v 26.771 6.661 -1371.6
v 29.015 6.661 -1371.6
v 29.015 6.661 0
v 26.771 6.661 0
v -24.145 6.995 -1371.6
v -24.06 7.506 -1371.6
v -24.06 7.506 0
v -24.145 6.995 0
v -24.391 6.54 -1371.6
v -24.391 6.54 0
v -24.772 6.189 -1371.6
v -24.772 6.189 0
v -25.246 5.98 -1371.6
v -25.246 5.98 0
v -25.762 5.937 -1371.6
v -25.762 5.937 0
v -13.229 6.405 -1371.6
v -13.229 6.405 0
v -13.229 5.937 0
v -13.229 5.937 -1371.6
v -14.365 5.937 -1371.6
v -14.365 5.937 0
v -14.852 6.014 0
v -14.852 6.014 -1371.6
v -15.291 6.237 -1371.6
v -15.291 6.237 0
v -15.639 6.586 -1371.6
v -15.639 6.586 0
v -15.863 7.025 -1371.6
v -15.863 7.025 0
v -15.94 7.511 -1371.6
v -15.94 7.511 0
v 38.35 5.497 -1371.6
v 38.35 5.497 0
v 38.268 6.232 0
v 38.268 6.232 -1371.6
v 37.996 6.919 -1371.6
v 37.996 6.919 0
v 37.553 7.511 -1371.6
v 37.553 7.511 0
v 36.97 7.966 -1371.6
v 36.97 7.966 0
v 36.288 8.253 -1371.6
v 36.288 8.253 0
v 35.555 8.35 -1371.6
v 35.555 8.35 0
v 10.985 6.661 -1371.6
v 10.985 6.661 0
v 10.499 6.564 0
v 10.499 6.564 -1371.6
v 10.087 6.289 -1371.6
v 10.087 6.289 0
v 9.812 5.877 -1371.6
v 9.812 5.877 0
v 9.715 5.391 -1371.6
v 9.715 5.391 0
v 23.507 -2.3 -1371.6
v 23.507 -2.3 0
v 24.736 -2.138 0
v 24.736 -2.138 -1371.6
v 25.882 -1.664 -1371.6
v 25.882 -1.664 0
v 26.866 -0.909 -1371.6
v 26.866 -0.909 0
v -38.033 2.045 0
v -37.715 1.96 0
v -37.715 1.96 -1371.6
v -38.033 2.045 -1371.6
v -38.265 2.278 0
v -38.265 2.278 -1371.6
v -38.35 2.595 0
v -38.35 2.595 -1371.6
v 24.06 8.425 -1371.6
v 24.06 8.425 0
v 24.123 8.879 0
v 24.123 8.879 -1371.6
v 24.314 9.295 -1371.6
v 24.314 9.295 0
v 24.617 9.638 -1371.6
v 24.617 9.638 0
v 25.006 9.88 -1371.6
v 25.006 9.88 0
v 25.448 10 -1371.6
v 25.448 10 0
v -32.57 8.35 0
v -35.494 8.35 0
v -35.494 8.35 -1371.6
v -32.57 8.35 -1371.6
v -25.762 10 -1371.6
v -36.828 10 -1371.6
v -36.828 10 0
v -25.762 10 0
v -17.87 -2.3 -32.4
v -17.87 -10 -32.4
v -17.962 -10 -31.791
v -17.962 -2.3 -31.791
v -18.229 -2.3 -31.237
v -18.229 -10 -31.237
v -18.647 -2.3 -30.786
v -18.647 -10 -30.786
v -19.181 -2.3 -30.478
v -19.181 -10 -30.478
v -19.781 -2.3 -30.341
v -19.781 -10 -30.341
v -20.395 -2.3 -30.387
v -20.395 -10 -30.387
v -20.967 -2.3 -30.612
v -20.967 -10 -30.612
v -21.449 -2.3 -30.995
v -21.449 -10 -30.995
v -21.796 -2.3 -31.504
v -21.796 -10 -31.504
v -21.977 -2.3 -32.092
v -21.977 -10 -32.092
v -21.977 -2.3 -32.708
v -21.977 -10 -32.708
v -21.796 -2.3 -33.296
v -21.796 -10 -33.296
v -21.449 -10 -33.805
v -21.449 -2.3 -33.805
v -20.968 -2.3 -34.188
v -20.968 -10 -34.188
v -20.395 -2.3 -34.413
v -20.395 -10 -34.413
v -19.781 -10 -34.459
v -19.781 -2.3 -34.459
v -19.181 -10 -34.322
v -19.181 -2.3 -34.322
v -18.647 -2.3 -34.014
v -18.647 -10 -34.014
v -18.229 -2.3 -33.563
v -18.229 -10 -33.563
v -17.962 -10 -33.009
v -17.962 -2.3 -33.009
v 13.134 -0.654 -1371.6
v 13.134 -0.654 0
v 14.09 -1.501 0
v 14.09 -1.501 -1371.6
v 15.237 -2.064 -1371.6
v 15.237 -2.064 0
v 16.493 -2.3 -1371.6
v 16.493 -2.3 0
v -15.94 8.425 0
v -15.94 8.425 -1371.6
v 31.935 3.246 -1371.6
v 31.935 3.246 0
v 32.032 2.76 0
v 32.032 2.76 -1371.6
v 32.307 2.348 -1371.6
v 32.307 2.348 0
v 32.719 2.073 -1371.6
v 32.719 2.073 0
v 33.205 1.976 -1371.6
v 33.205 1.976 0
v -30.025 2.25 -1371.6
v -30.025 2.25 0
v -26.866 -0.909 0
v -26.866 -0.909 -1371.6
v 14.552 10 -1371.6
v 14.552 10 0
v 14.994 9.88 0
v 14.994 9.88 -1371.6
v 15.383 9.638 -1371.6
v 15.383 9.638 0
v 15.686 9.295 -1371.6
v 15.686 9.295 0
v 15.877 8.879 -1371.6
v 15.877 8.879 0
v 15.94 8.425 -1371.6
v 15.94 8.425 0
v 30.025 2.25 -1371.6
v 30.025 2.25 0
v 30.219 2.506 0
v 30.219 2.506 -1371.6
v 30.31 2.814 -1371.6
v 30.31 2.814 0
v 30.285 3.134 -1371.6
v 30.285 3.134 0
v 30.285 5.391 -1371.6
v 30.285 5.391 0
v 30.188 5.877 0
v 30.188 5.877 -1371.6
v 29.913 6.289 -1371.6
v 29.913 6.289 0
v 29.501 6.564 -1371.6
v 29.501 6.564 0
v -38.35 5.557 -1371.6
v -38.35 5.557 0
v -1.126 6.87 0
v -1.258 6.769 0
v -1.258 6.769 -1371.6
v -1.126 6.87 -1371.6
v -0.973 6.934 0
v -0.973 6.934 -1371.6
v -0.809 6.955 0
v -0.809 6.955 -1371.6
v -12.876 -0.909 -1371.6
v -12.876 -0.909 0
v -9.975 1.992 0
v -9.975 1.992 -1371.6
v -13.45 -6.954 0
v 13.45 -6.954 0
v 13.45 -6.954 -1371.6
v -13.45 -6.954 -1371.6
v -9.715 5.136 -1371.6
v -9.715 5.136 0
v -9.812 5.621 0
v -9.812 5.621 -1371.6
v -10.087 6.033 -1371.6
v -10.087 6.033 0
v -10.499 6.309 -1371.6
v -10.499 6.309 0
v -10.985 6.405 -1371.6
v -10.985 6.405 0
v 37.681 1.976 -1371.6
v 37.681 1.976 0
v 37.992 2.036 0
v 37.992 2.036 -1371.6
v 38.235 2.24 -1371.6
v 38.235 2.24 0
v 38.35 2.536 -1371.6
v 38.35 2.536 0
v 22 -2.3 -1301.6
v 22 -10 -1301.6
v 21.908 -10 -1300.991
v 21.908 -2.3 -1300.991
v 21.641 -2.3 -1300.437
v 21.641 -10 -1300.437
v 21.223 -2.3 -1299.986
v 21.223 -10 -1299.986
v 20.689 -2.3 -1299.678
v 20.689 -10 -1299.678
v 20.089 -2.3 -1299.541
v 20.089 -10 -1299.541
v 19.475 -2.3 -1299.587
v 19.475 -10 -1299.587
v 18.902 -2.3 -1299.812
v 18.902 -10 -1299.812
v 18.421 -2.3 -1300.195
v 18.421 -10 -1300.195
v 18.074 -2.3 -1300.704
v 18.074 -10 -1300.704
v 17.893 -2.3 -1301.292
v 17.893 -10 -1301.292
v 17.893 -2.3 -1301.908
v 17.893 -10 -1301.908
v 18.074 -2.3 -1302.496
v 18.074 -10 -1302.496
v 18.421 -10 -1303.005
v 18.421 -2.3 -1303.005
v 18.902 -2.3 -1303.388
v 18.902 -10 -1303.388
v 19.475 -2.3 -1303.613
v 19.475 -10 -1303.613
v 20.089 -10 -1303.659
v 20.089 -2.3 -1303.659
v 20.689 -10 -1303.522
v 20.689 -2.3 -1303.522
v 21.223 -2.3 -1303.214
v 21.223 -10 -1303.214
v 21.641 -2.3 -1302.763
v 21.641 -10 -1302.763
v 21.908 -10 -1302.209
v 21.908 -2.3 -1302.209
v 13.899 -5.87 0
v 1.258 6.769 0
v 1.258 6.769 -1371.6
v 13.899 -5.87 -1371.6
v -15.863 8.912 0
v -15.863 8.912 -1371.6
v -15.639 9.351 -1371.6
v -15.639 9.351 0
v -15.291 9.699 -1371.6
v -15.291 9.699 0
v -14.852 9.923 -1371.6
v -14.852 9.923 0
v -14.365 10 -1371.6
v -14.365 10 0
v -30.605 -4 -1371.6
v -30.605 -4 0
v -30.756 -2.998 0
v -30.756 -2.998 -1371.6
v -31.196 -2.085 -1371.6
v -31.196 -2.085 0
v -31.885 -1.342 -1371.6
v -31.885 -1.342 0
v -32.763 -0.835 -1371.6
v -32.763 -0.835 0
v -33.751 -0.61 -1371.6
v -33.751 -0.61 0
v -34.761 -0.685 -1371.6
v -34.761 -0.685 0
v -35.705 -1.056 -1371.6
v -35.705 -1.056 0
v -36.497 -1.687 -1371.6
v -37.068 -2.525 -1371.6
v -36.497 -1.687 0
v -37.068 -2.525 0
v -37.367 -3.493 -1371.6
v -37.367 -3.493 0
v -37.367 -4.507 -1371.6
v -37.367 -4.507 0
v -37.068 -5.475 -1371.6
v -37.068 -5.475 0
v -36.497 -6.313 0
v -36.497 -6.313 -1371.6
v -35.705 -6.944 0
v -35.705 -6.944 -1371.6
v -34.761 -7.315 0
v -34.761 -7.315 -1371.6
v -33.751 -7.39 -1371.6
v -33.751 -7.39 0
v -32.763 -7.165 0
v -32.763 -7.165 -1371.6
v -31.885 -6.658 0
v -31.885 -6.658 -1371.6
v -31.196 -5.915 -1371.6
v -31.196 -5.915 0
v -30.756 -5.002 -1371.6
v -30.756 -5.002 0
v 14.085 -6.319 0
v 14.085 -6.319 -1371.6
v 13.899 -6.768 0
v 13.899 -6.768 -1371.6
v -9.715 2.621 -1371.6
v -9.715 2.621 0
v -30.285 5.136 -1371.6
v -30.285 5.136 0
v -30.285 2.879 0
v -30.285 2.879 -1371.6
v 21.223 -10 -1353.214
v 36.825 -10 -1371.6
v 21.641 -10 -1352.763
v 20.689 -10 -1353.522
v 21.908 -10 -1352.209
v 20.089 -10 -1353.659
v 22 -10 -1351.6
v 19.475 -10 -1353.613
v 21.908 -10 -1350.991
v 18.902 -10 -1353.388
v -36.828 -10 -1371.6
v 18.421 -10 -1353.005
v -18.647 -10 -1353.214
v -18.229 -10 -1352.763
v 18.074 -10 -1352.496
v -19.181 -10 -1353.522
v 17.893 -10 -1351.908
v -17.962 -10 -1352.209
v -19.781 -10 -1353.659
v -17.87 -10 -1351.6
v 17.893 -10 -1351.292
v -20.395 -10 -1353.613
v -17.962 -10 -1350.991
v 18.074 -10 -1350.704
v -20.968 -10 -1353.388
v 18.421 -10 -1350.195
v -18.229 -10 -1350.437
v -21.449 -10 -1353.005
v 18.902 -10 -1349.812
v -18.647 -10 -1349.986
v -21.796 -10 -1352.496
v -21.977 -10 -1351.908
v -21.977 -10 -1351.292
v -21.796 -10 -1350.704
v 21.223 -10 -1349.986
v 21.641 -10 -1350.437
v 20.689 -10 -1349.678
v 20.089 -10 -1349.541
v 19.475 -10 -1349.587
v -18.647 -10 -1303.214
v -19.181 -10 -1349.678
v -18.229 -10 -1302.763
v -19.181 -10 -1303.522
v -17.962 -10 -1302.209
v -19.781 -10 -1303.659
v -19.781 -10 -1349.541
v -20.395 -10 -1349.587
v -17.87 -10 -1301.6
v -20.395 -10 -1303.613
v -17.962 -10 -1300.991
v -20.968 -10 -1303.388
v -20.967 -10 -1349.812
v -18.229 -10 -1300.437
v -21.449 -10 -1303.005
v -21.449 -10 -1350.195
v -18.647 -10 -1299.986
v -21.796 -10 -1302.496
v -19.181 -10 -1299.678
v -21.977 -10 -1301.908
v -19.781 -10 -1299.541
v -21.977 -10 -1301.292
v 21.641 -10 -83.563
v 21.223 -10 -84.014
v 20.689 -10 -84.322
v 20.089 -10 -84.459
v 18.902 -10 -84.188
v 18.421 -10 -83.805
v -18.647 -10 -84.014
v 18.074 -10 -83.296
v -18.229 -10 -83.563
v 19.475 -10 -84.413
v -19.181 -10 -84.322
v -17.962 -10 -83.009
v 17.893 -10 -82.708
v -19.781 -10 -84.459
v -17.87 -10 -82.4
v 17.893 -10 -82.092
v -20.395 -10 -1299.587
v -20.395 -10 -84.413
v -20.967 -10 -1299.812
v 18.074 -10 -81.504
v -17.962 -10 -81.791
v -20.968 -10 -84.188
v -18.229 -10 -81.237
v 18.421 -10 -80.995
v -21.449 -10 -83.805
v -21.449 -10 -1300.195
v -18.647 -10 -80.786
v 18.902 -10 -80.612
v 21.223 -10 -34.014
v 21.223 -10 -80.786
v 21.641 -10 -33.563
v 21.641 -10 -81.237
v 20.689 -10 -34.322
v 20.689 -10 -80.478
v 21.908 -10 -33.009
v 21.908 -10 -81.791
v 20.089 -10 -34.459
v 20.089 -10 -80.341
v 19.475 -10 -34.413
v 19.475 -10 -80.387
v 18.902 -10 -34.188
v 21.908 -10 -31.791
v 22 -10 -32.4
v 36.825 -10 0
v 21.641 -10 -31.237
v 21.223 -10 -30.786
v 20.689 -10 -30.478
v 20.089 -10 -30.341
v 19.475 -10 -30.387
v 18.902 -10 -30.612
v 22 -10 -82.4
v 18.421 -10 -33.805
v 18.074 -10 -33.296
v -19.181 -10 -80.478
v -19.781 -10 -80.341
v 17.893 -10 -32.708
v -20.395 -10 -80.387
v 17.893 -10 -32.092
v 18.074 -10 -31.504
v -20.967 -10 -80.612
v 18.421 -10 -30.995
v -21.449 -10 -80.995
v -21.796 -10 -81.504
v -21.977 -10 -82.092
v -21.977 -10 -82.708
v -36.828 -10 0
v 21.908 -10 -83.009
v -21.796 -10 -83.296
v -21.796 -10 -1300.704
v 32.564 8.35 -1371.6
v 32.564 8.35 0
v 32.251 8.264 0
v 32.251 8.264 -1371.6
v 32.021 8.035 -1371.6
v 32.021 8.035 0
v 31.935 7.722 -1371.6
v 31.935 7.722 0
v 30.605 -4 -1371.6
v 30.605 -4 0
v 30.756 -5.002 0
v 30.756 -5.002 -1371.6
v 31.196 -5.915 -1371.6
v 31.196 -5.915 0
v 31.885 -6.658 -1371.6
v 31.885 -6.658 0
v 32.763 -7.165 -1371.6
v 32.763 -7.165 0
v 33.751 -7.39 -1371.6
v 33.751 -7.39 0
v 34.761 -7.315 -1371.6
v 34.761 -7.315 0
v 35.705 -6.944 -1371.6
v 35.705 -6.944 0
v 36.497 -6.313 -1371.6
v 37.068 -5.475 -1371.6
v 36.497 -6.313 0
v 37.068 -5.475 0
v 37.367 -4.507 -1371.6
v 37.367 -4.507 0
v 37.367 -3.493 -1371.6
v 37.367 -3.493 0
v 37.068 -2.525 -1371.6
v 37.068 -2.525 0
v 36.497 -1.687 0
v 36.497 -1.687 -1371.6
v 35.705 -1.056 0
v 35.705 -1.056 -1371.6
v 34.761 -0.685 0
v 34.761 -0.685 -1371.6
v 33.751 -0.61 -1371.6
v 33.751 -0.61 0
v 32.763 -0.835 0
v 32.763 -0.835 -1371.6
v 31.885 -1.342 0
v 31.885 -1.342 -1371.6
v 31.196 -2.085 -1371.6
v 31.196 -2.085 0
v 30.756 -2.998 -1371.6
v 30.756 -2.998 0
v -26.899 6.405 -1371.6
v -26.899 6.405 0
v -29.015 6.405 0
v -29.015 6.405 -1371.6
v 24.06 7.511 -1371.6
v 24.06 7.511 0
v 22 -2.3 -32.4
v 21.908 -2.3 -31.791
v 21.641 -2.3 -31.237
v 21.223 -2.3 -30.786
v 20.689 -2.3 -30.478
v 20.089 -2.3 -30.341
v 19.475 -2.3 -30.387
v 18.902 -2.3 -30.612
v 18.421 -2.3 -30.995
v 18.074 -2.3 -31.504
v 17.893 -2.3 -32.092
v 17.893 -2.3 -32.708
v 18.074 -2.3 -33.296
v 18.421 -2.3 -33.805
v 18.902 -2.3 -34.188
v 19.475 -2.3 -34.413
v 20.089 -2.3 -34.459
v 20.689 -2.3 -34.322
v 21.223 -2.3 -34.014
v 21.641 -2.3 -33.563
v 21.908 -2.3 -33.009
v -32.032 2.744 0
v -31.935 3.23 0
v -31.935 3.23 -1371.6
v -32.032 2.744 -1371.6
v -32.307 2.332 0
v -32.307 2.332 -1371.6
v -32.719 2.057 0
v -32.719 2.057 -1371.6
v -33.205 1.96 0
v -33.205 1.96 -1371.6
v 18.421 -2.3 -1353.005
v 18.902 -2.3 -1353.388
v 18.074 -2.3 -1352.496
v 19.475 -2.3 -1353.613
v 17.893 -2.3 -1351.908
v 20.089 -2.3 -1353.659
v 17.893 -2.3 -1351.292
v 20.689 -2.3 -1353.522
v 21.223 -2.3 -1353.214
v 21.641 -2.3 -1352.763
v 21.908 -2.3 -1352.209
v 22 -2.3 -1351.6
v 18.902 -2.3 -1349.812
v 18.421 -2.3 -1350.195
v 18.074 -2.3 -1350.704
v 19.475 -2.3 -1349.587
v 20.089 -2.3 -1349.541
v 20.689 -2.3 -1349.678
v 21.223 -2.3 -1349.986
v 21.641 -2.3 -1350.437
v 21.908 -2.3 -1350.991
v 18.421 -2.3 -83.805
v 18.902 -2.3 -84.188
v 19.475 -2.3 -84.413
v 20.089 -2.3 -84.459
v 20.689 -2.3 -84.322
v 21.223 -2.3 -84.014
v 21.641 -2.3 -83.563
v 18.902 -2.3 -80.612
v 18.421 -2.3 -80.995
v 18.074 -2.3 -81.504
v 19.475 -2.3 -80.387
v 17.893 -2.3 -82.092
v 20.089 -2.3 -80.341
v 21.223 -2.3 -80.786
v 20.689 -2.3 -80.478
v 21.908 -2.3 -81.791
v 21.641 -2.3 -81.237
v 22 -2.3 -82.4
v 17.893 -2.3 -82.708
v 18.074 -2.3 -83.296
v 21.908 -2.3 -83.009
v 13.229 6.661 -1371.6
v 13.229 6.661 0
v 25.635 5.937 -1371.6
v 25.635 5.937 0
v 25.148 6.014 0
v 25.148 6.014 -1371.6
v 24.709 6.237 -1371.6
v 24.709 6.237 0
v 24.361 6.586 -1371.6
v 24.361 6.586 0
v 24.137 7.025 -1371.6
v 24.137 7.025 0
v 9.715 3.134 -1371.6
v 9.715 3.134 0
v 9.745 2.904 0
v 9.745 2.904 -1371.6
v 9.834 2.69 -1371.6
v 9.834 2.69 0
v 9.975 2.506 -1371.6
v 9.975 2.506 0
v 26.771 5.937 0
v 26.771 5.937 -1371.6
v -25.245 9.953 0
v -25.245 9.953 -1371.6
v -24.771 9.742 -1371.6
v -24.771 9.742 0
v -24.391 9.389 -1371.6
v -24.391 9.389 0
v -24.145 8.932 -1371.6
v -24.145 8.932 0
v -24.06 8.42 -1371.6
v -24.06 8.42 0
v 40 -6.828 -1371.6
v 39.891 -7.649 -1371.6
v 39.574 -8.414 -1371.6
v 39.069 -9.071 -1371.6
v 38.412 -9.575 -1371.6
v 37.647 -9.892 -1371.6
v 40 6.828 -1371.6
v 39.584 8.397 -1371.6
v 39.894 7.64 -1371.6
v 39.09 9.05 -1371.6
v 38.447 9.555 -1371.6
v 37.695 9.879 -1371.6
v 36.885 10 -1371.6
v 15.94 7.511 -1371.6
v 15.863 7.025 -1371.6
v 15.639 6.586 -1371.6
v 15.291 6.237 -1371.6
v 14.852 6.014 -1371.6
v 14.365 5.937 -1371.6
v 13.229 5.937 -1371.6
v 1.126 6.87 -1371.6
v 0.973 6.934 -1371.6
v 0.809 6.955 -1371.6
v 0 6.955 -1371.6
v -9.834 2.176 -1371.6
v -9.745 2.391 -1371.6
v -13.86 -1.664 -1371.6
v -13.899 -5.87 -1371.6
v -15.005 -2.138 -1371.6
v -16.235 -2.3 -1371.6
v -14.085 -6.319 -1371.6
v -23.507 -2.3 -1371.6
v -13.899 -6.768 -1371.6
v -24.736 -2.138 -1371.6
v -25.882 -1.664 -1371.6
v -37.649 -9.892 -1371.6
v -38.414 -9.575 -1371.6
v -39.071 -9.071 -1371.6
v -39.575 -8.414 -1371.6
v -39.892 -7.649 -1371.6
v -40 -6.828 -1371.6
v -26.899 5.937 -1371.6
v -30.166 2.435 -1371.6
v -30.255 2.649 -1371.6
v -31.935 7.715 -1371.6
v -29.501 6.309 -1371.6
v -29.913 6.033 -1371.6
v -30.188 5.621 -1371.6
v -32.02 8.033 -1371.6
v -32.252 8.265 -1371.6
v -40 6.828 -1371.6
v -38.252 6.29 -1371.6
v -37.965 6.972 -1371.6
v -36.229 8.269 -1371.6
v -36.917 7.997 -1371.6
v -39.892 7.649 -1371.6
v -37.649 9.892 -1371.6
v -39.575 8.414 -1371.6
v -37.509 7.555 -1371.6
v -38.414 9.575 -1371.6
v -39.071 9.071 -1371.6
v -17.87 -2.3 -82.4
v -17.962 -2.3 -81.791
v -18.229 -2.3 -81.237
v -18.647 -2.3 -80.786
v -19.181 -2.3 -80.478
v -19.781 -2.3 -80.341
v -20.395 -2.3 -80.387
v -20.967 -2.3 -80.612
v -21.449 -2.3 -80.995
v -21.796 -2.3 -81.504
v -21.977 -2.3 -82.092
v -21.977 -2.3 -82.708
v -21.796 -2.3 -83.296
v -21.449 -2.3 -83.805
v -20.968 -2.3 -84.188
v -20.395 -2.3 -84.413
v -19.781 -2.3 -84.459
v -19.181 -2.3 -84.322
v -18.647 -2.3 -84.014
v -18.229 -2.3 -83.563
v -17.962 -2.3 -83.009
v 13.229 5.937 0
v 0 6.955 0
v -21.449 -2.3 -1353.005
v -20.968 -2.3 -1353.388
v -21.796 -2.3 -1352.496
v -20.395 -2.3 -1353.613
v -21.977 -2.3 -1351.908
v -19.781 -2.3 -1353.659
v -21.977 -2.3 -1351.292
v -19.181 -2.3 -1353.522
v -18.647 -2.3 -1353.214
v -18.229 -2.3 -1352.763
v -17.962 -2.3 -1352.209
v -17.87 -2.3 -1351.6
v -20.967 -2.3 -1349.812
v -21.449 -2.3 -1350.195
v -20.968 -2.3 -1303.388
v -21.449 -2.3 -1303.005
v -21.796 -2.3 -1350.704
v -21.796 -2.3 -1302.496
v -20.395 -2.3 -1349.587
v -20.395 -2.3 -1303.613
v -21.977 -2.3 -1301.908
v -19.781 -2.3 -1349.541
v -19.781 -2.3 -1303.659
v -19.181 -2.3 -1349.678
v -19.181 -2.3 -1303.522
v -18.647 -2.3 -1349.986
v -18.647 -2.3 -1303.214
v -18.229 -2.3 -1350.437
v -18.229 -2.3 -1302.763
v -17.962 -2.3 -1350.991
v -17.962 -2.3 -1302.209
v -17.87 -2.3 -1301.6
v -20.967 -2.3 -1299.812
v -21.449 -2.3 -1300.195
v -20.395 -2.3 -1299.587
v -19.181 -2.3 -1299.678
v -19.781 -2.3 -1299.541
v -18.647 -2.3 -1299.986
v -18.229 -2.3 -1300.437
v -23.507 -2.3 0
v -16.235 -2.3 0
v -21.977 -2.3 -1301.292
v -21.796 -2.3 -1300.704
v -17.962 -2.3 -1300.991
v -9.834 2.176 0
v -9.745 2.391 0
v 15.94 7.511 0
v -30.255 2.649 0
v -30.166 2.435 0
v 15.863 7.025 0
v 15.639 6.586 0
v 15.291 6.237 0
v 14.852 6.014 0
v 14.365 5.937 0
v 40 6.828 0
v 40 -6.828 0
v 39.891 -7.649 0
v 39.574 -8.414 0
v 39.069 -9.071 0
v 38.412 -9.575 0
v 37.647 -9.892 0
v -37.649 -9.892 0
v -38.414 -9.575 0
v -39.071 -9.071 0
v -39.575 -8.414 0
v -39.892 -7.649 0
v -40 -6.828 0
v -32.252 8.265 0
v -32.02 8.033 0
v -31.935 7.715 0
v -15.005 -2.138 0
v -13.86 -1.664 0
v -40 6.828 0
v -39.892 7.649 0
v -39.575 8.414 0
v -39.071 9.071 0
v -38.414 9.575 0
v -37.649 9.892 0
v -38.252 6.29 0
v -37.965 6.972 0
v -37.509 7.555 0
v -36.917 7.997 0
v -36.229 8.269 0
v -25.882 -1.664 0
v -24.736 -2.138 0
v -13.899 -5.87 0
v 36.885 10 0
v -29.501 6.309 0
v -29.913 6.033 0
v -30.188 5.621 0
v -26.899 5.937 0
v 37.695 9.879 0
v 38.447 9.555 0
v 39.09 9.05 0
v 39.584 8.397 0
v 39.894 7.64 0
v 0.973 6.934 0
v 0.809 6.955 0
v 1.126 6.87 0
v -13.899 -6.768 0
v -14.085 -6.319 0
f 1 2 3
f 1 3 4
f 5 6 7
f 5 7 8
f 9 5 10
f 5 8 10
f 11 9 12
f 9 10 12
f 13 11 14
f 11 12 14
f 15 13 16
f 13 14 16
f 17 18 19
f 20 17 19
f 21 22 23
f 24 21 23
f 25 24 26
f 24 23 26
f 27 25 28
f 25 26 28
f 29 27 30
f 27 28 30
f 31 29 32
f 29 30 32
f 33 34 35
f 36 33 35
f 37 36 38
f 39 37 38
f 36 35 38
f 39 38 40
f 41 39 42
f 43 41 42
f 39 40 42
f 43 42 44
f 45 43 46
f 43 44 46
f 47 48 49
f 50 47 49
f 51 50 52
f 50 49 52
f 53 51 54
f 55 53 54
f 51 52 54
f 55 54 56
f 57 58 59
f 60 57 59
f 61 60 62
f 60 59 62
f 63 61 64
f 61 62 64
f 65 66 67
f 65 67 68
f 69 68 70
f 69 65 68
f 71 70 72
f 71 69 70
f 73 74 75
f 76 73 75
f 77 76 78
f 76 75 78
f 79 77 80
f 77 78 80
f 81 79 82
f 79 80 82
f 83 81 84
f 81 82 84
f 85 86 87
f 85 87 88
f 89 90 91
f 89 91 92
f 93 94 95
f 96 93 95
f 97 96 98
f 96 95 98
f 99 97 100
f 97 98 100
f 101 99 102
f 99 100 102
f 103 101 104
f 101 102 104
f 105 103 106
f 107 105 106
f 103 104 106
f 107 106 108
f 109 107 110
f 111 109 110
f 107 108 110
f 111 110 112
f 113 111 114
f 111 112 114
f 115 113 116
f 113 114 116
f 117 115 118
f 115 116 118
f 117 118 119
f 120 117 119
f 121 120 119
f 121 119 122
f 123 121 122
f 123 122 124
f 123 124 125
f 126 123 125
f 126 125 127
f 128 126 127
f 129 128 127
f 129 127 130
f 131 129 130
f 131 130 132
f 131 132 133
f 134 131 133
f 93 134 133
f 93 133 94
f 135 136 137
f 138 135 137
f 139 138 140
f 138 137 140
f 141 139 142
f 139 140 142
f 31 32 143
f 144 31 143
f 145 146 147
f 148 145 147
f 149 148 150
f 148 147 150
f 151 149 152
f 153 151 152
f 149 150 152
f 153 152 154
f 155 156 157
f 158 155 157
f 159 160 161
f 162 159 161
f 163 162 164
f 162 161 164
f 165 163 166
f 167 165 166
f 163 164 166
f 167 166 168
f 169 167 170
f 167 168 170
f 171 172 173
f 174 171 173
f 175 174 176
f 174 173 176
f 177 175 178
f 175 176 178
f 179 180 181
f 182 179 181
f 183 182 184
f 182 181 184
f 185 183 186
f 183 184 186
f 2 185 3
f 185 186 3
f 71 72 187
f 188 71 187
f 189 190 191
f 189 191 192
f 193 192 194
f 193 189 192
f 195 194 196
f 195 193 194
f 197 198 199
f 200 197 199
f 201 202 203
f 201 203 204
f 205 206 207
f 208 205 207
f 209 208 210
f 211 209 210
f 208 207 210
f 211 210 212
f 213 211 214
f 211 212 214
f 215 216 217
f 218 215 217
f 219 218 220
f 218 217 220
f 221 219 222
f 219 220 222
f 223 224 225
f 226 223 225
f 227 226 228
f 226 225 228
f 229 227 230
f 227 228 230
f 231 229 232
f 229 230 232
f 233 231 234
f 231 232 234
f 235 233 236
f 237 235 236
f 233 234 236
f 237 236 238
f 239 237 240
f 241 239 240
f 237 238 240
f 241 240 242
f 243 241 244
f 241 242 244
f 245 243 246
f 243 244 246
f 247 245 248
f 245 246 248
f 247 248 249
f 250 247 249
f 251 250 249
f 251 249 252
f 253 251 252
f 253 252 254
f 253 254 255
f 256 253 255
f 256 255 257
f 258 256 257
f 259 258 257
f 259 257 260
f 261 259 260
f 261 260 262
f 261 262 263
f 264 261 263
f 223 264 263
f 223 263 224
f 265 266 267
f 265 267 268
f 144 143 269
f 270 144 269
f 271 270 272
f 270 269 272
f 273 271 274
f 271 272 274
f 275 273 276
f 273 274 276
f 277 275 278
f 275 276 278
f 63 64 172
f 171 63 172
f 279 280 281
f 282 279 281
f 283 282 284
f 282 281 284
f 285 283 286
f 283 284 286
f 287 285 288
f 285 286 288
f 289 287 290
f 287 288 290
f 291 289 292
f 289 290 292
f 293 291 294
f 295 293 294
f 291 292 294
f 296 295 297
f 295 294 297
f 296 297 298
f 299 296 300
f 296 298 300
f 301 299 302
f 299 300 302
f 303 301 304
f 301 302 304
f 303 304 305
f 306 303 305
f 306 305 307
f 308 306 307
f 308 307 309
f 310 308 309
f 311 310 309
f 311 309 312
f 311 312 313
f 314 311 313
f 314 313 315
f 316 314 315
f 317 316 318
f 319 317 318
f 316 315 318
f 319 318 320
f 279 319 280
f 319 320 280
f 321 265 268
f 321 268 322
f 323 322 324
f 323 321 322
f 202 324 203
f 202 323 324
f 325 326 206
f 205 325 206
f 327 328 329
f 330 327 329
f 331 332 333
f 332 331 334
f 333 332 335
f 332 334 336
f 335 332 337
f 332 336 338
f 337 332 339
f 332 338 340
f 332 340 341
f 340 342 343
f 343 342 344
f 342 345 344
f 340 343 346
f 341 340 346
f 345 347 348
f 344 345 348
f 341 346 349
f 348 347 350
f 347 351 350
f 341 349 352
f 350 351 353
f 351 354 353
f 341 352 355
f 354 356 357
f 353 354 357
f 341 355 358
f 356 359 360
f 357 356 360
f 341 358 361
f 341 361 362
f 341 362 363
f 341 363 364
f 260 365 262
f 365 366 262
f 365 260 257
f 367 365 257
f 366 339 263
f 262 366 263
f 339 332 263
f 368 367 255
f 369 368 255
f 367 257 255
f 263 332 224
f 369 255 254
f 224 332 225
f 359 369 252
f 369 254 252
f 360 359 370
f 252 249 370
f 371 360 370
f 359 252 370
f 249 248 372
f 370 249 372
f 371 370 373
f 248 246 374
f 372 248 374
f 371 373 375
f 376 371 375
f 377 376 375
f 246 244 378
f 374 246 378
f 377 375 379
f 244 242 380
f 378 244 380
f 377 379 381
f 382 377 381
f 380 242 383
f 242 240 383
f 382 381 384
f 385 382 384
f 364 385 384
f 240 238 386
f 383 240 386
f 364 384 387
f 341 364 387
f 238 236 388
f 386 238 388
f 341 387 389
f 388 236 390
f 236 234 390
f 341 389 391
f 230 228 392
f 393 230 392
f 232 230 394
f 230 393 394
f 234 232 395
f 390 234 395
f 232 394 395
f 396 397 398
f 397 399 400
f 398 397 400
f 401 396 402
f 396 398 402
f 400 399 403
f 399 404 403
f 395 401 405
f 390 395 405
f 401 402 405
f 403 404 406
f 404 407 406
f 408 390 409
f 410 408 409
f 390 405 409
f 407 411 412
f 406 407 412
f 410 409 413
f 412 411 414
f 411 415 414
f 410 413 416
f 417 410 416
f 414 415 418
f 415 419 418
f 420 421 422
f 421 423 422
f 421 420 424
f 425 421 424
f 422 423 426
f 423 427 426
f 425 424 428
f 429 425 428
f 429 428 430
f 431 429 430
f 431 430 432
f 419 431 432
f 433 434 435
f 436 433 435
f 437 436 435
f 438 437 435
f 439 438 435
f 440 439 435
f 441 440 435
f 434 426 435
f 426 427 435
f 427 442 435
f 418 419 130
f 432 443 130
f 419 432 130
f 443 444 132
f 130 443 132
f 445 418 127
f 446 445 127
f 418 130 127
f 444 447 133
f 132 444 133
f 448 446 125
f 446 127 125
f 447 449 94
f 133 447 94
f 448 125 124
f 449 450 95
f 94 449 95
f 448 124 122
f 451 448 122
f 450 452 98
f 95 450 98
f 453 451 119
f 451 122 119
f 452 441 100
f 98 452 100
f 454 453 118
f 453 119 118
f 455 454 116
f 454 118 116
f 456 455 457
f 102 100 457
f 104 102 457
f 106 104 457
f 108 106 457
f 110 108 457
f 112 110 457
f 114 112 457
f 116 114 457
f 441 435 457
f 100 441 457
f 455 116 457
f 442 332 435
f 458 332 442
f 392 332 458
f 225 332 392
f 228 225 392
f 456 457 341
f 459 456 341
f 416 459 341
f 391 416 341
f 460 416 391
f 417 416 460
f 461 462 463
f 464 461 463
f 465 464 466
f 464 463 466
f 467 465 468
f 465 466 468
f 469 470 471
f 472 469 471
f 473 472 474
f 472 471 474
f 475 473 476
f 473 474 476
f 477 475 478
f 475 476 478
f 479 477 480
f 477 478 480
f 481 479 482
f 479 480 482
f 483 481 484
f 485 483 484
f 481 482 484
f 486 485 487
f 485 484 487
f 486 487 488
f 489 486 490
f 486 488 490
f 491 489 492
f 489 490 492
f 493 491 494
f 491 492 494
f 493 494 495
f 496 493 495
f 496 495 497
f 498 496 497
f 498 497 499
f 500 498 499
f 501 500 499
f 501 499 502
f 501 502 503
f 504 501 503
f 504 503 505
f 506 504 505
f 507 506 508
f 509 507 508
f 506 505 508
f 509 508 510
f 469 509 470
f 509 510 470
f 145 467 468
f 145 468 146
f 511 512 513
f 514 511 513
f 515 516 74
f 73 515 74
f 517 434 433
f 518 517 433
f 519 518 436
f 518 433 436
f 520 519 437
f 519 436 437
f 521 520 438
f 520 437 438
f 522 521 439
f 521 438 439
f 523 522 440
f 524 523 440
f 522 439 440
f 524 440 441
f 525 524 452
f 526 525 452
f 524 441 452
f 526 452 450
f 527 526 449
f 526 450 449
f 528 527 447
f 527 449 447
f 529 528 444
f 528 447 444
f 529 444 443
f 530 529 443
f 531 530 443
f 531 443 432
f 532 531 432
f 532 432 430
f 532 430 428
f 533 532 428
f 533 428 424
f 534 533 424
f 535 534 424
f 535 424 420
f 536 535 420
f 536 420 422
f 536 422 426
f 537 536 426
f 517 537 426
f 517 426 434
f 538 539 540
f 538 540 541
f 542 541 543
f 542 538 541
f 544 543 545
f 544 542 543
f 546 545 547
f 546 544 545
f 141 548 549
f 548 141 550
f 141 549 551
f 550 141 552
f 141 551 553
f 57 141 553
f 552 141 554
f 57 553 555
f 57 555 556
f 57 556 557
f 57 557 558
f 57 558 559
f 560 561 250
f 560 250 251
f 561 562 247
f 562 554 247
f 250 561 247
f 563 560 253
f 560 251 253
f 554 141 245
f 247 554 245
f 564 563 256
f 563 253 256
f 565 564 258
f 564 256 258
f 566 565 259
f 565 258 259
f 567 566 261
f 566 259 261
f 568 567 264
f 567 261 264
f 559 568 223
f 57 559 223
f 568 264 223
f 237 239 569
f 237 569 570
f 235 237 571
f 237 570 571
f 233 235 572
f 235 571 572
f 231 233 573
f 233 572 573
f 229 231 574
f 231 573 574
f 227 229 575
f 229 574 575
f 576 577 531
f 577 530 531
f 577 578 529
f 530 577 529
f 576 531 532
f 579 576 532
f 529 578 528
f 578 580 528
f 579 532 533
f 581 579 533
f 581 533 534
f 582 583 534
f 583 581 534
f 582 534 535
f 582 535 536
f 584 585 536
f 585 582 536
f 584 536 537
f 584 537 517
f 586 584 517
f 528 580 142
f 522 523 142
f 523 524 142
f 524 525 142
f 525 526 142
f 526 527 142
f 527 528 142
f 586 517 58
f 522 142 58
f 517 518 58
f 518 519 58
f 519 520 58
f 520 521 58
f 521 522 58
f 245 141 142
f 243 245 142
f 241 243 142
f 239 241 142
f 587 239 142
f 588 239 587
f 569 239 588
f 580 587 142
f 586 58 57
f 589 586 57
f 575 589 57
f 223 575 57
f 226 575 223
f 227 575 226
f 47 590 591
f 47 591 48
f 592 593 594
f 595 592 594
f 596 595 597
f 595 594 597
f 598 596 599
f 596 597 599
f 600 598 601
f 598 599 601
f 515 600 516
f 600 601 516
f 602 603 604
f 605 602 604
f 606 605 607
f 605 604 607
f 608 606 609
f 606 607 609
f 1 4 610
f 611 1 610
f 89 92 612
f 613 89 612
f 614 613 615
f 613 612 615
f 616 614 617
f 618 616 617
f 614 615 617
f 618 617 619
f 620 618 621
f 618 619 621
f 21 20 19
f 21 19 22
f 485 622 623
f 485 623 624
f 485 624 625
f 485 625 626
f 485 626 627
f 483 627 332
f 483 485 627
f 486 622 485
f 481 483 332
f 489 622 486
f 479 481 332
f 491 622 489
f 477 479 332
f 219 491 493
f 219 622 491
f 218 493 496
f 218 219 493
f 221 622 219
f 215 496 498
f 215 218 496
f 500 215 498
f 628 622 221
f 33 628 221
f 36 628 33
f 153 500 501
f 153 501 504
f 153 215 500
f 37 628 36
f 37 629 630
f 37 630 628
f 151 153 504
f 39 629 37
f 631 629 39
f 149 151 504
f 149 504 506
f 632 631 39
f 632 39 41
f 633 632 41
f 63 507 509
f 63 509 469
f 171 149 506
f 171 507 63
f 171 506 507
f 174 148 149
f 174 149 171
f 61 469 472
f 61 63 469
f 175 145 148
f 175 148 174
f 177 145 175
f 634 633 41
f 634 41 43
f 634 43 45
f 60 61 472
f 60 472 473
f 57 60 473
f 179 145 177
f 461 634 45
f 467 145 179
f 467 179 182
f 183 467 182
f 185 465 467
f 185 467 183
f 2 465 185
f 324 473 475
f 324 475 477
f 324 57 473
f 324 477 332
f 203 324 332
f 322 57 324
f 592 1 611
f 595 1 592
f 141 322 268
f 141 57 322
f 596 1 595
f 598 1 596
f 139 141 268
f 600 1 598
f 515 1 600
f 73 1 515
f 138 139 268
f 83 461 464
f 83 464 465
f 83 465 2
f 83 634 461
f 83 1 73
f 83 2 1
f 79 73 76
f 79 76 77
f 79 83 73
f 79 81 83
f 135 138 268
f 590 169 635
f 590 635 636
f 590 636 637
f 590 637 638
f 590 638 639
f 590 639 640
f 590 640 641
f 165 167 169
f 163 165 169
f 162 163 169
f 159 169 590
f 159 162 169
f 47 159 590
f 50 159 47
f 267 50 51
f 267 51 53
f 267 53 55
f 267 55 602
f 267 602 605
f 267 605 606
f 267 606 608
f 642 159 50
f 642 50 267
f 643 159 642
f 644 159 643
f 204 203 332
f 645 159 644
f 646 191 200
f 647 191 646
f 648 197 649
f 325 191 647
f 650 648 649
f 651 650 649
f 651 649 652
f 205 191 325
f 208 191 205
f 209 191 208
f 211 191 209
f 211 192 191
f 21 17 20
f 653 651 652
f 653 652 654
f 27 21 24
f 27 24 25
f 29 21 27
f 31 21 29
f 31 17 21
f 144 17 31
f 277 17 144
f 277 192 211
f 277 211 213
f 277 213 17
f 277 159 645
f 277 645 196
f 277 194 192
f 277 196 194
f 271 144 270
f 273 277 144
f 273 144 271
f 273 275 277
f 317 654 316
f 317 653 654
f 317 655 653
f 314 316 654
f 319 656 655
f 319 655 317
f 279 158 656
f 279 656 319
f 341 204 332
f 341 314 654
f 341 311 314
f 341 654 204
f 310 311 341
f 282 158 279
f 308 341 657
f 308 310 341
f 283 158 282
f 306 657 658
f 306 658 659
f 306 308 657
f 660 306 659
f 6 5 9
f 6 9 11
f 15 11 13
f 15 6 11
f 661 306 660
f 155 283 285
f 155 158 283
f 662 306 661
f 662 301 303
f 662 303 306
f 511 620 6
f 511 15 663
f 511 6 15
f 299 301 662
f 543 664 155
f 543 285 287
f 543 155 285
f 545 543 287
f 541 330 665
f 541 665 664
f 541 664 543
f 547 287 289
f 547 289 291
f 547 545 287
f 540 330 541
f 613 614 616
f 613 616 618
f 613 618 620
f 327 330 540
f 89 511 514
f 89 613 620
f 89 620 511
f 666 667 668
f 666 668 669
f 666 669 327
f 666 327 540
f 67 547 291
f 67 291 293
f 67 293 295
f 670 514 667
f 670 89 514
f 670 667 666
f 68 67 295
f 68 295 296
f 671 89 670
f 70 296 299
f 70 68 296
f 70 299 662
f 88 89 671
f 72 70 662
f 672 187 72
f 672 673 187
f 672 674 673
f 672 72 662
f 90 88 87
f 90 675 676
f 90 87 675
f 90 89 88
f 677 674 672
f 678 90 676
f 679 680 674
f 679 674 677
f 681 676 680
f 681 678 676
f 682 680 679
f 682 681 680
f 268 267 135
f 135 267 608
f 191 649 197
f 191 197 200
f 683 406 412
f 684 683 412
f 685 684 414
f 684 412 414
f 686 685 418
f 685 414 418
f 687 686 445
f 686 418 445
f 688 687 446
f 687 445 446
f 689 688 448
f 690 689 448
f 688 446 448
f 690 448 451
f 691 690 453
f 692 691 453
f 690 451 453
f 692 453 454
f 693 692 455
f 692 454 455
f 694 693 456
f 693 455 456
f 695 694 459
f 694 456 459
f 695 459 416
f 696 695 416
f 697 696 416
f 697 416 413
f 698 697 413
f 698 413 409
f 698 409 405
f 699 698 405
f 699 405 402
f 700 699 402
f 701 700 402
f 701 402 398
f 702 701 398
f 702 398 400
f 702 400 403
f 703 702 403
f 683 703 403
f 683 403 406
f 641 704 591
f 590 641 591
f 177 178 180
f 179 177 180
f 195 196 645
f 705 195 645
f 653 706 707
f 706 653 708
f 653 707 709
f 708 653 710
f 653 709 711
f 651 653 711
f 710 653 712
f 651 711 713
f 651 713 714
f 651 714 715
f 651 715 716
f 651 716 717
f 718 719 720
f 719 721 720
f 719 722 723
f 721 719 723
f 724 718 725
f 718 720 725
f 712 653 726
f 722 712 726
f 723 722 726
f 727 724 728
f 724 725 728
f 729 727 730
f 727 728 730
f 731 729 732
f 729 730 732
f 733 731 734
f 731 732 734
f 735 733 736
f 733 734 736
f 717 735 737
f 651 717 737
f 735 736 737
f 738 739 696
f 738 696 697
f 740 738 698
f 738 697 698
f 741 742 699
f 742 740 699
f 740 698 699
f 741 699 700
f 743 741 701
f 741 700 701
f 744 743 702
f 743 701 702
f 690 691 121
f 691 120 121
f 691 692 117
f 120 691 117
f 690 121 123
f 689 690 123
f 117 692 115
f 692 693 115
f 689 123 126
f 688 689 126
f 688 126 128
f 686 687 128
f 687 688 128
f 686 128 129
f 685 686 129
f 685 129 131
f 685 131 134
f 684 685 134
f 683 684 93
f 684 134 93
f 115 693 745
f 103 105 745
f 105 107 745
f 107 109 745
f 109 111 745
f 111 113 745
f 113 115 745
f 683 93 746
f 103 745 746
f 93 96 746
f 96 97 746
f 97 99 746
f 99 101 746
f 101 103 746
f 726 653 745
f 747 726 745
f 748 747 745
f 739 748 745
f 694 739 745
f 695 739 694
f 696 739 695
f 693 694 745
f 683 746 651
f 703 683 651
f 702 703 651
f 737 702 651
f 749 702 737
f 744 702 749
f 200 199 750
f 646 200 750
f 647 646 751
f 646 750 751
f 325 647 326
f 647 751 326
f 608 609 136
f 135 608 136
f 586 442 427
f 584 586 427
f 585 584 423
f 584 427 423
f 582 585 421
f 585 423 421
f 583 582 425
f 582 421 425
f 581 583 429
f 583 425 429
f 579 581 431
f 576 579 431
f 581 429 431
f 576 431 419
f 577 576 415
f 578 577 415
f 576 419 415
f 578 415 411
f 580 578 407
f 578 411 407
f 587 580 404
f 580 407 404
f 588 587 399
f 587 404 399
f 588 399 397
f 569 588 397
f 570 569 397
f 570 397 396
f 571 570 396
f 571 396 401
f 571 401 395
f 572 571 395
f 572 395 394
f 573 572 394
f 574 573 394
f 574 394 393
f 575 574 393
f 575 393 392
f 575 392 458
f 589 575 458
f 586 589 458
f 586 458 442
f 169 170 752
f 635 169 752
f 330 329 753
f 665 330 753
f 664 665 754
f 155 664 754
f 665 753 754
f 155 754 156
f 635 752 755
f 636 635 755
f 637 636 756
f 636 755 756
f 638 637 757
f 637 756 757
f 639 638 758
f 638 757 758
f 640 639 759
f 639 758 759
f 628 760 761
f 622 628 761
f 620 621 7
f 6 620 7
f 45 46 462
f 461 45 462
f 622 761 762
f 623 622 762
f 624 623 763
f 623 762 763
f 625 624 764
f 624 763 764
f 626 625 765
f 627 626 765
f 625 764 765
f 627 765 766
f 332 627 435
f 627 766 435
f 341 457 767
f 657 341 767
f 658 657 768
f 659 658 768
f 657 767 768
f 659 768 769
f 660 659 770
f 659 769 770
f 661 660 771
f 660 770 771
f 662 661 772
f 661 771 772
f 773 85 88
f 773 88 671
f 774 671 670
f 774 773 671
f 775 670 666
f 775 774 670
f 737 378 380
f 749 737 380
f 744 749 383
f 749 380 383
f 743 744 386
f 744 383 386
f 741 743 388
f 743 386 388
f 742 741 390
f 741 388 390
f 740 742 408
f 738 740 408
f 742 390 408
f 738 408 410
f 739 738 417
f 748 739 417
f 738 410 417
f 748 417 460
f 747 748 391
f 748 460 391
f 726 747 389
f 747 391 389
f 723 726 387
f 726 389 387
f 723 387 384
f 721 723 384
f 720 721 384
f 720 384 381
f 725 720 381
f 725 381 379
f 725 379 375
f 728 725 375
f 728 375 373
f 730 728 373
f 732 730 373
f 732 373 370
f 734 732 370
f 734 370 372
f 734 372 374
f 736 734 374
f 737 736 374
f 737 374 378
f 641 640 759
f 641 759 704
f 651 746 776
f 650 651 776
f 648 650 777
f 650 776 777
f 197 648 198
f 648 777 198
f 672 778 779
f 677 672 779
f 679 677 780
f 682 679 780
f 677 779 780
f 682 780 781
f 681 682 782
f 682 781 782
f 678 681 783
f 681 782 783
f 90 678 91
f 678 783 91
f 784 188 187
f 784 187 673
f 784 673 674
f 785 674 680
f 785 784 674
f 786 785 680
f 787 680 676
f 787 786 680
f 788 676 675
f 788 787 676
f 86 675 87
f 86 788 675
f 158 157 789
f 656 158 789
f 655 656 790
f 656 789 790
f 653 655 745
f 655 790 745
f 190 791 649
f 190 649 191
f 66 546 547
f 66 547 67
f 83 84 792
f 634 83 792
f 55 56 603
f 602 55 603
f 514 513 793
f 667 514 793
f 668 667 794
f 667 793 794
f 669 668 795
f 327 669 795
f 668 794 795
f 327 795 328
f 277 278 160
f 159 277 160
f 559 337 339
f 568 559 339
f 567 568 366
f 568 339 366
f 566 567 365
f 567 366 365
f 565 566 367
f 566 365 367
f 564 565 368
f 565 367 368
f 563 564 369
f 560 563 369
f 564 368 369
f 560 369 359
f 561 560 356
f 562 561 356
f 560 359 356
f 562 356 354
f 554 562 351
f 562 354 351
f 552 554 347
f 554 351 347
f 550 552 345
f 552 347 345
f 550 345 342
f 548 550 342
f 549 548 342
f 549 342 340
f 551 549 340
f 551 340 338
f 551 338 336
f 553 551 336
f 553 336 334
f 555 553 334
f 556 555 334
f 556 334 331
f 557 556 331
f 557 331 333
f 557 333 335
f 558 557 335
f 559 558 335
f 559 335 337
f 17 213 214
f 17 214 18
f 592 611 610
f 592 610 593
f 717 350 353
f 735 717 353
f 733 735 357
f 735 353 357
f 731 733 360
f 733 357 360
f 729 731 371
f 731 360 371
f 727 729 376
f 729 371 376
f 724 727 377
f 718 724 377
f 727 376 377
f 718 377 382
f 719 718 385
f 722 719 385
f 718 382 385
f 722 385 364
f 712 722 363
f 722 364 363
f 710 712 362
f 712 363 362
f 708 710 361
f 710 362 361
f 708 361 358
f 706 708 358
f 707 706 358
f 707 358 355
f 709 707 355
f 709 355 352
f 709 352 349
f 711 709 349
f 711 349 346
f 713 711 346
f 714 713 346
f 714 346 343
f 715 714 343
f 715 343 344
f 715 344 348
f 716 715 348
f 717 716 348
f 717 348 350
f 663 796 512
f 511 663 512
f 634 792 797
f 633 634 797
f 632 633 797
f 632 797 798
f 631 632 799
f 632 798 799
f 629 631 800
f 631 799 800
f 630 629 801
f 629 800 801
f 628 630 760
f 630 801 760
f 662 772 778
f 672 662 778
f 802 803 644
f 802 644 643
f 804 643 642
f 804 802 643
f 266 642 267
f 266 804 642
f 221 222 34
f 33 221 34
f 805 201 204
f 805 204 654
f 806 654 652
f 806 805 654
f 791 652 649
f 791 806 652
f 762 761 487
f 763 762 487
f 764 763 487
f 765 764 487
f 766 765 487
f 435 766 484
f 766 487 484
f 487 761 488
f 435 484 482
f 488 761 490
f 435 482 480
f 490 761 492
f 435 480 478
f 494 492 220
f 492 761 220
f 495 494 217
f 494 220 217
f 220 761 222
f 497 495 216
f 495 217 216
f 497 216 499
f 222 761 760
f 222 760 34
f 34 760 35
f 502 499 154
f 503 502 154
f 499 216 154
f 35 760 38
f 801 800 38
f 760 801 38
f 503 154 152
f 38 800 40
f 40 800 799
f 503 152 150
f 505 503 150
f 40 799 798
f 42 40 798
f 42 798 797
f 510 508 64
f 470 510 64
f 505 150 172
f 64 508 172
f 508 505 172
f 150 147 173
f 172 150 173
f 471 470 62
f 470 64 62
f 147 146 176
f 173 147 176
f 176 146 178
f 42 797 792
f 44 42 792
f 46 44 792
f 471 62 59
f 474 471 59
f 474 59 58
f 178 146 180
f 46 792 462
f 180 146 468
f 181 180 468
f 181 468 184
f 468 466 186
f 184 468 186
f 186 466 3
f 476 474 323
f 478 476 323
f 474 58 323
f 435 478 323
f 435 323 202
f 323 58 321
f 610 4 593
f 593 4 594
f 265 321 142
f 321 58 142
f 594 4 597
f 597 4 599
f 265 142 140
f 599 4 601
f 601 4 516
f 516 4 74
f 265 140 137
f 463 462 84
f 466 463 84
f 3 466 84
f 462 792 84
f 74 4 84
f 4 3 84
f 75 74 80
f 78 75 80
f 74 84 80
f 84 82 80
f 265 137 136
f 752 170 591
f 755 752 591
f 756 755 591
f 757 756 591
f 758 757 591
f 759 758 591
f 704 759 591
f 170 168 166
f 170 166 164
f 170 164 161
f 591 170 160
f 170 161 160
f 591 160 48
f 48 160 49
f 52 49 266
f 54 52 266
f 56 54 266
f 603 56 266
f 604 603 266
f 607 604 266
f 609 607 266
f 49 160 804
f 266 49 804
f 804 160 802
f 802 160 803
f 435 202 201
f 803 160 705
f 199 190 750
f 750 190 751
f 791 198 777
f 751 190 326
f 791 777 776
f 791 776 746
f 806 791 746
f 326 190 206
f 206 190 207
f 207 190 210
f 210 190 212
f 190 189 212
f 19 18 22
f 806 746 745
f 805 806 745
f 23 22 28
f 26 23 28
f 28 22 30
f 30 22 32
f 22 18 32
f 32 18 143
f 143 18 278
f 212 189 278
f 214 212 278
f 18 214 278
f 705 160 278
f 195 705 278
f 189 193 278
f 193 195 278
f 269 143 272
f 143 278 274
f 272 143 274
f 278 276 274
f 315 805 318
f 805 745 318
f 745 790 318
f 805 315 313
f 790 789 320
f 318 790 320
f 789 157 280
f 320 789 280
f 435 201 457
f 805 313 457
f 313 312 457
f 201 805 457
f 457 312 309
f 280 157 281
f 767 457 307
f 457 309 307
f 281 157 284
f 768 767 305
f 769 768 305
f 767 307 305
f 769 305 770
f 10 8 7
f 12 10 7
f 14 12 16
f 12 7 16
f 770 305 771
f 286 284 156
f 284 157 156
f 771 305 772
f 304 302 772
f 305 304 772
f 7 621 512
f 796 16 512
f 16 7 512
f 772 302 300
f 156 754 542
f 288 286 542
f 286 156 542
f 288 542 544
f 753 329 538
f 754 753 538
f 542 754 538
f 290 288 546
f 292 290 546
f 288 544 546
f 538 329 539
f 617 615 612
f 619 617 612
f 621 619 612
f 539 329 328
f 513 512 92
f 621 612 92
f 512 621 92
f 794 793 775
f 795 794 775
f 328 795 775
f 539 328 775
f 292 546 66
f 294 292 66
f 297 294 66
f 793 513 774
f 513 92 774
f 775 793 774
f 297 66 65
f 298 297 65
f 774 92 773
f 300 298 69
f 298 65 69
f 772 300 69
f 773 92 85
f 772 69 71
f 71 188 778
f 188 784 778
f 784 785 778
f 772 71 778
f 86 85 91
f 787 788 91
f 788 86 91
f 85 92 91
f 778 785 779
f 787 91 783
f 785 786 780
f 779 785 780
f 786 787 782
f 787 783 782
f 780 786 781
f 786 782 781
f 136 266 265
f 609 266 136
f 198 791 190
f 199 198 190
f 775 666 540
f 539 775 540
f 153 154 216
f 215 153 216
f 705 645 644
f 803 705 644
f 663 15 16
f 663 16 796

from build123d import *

# Parameters (mm, degrees)
SKETCH1_R          = 3.4
SKETCH1_R_2        = 3.400000006
EXTRUDE1_DEPTH     = 1371.6
SKETCH2_R          = 2.065
CUT_EXTRUDE1_DEPTH = 1373.328945544
SKETCH8_R          = 2.065
CUT_EXTRUDE2_DEPTH = 10


with BuildPart() as part:
    # Sketch1 → Extrude1 (new body)
    with BuildSketch(Plane.XY):
        with BuildLine():
            Line((-36.828217803, 10), (-25.761678346, 10))
            ThreePointArc((-25.761678346, 10), (-24.566343162, 9.581217839), (-24.06, 8.420260776))
            Line((-24.06, 8.420260776), (-24.06, 7.505975062))
            ThreePointArc((-24.06, 7.505975062), (-24.567063435, 6.348506245), (-25.761678346, 5.936507937))
            Line((-25.761678346, 5.936507937), (-26.89856374, 5.936507937))
            Line((-26.89856374, 5.936507937), (-26.89856374, 6.405354551))
            Line((-26.89856374, 6.405354551), (-29.01515873, 6.405354551))
            ThreePointArc((-29.01515873, 6.405354551), (-29.913072103, 6.033426654), (-30.285, 5.135513281))
            Line((-30.285, 5.135513281), (-30.285, 2.878955078))
            ThreePointArc((-30.285, 2.878955078), (-30.217342047, 2.538803338), (-30.024667785, 2.250433031))
            Line((-30.024667785, 2.250433031), (-26.865511635, -0.908897163))
            ThreePointArc((-26.865511635, -0.908897163), (-25.324726136, -1.938463161), (-23.50722312, -2.3))
            Line((-23.50722312, -2.3), (-16.234679932, -2.3))
            ThreePointArc((-16.234679932, -2.3), (-14.417176915, -1.938463161), (-12.876391416, -0.908897163))
            Line((-12.876391416, -0.908897163), (-9.975332215, 1.992321863))
            ThreePointArc((-9.975332215, 1.992321863), (-9.782657953, 2.28069217), (-9.715, 2.620843911))
            Line((-9.715, 2.620843911), (-9.715, 5.135513281))
            ThreePointArc((-9.715, 5.135513281), (-10.086927897, 6.033426654), (-10.98484127, 6.405354551))
            Line((-10.98484127, 6.405354551), (-13.228511431, 6.405354551))
            Line((-13.228511431, 6.405354551), (-13.228511431, 5.936507937))
            Line((-13.228511431, 5.936507937), (-14.365396825, 5.936507937))
            ThreePointArc((-14.365396825, 5.936507937), (-15.478809408, 6.397698529), (-15.94, 7.511111111))
            Line((-15.94, 7.511111111), (-15.94, 8.425396825))
            ThreePointArc((-15.94, 8.425396825), (-15.478809408, 9.538809408), (-14.365396825, 10))
            Line((-14.365396825, 10), (-7.044126982, 10))
            Line((-7.044126982, 10), (14.552471996, 10))
            ThreePointArc((14.552471996, 10), (15.546813416, 9.477564883), (15.94, 8.425396825))
            Line((15.94, 8.425396825), (15.94, 7.511111111))
            ThreePointArc((15.94, 7.511111111), (15.478809408, 6.397698529), (14.365396825, 5.936507937))
            Line((14.365396825, 5.936507937), (13.228511431, 5.936507937))
            Line((13.228511431, 5.936507937), (13.228511431, 6.660633301))
            Line((13.228511431, 6.660633301), (10.98484127, 6.660633301))
            ThreePointArc((10.98484127, 6.660633301), (10.086927897, 6.288705404), (9.715, 5.390792031))
            Line((9.715, 5.390792031), (9.715, 3.134233829))
            ThreePointArc((9.715, 3.134233829), (9.782657953, 2.794082088), (9.975332215, 2.505711781))
            Line((9.975332215, 2.505711781), (13.134488365, -0.653618412))
            ThreePointArc((13.134488365, -0.653618412), (14.64473832, -1.821319739), (16.49277688, -2.3))
            Line((16.49277688, -2.3), (23.50722312, -2.3))
            ThreePointArc((23.50722312, -2.3), (25.324726136, -1.938463161), (26.865511635, -0.908897163))
            Line((26.865511635, -0.908897163), (30.024667785, 2.250433031))
            ThreePointArc((30.024667785, 2.250433031), (30.278278636, 2.655971567), (30.285, 3.134233829))
            Line((30.285, 3.134233829), (30.285, 5.390792031))
            ThreePointArc((30.285, 5.390792031), (29.913072103, 6.288705404), (29.01515873, 6.660633301))
            Line((29.01515873, 6.660633301), (26.771488569, 6.660633301))
            Line((26.771488569, 6.660633301), (26.771488569, 5.936507937))
            Line((26.771488569, 5.936507937), (25.634603175, 5.936507937))
            ThreePointArc((25.634603175, 5.936507937), (24.521190592, 6.397698529), (24.06, 7.511111111))
            Line((24.06, 7.511111111), (24.06, 8.425396825))
            ThreePointArc((24.06, 8.425396825), (24.453186584, 9.477564883), (25.447528004, 10))
            Line((25.447528004, 10), (33.075833554, 10))
            Line((33.075833554, 10), (36.885357363, 10))
            ThreePointArc((36.885357363, 10), (39.090491138, 9.050251023), (40, 6.828217785))
            Line((40, 6.828217785), (40, -6.828217785))
            ThreePointArc((40, -6.828217785), (39.069183486, -9.071177839), (36.825396825, -10))
            Line((36.825396825, -10), (-36.828217803, -10))
            ThreePointArc((-36.828217803, -10), (-39.071006503, -9.071006503), (-40, -6.828217803))
            Line((-40, -6.828217803), (-40, 6.828217803))
            ThreePointArc((-40, 6.828217803), (-39.071006503, 9.071006503), (-36.828217803, 10))
        make_face()
        with Locations((-34.004773868, -4)):
            Circle(SKETCH1_R, mode=Mode.SUBTRACT)
        with Locations(Location((34.004773868, -4, 0), (0, 0, 180))):
            Circle(SKETCH1_R_2, mode=Mode.SUBTRACT)
        with BuildLine():
            Line((-38.35, 2.595292927), (-38.35, 5.557055178))
            ThreePointArc((-38.35, 5.557055178), (-37.509428882, 7.554544736), (-35.493548116, 8.35))
            Line((-35.493548116, 8.35), (-32.569919859, 8.35))
            ThreePointArc((-32.569919859, 8.35), (-32.120963721, 8.164036279), (-31.935, 7.715080141))
            Line((-31.935, 7.715080141), (-31.935, 3.230213422))
            ThreePointArc((-31.935, 3.230213422), (-32.306927856, 2.332300148), (-33.20484113, 1.960372292))
            Line((-33.20484113, 1.960372292), (-37.715079365, 1.960372292))
            ThreePointArc((-37.715079365, 1.960372292), (-38.164036052, 2.14633624), (-38.35, 2.595292927))
        make_face(mode=Mode.SUBTRACT)
        with BuildLine():
            Line((13.450195503, -6.954394873), (-13.450195503, -6.954394873))
            ThreePointArc((-13.450195503, -6.954394873), (-14.036762187, -6.562412722), (-13.89908728, -5.870490687))
            Line((-13.89908728, -5.870490687), (-1.257767926, 6.769315833))
            ThreePointArc((-1.257767926, 6.769315833), (-1.051776589, 6.906937009), (-0.808800063, 6.955252915))
            Line((-0.808800063, 6.955252915), (0, 6.955204454))
            Line((0, 6.955204454), (0.808800063, 6.955252915))
            ThreePointArc((0.808800063, 6.955252915), (1.051776589, 6.906937009), (1.257767926, 6.769315833))
            Line((1.257767926, 6.769315833), (13.89908728, -5.870490687))
            ThreePointArc((13.89908728, -5.870490687), (14.036762187, -6.562412722), (13.450195503, -6.954394873))
        make_face(mode=Mode.SUBTRACT)
        with BuildLine():
            Line((35.554894965, 8.35), (32.563967874, 8.35))
            ThreePointArc((32.563967874, 8.35), (32.121226634, 8.164362109), (31.935, 7.721868186))
            Line((31.935, 7.721868186), (31.935, 3.245873842))
            ThreePointArc((31.935, 3.245873842), (32.306927897, 2.347960469), (33.20484127, 1.976032573))
            Line((33.20484127, 1.976032573), (37.680832198, 1.976032573))
            ThreePointArc((37.680832198, 1.976032573), (38.126707117, 2.122693703), (38.35, 2.535554718))
            Line((38.35, 2.535554718), (38.35, 5.496770698))
            ThreePointArc((38.35, 5.496770698), (37.552616332, 7.511327921), (35.554894965, 8.35))
        make_face(mode=Mode.SUBTRACT)
    extrude(amount=-EXTRUDE1_DEPTH)

    # Sketch2 → Cut-Extrude1 (cut, through all)
    with BuildSketch(Plane.XZ.offset(10)):
        with Locations((-19.935, -1351.6)):
            Circle(SKETCH2_R)
        with Locations((-19.935, -1301.6)):
            Circle(SKETCH2_R)
        with Locations((19.935, -1301.6)):
            Circle(SKETCH2_R)
        with Locations((19.935, -1351.6)):
            Circle(SKETCH2_R)
    extrude(amount=-CUT_EXTRUDE1_DEPTH, mode=Mode.SUBTRACT)

    # Sketch8 → Cut-Extrude2 (cut)
    with BuildSketch(Plane.XZ.offset(10)):
        with Locations((-19.935, -82.4)):
            Circle(SKETCH8_R)
        with Locations((-19.935, -32.4)):
            Circle(SKETCH8_R)
        with Locations((19.935, -32.4)):
            Circle(SKETCH8_R)
        with Locations((19.935, -82.4)):
            Circle(SKETCH8_R)
    extrude(amount=-CUT_EXTRUDE2_DEPTH, mode=Mode.SUBTRACT)


solid = part.part
